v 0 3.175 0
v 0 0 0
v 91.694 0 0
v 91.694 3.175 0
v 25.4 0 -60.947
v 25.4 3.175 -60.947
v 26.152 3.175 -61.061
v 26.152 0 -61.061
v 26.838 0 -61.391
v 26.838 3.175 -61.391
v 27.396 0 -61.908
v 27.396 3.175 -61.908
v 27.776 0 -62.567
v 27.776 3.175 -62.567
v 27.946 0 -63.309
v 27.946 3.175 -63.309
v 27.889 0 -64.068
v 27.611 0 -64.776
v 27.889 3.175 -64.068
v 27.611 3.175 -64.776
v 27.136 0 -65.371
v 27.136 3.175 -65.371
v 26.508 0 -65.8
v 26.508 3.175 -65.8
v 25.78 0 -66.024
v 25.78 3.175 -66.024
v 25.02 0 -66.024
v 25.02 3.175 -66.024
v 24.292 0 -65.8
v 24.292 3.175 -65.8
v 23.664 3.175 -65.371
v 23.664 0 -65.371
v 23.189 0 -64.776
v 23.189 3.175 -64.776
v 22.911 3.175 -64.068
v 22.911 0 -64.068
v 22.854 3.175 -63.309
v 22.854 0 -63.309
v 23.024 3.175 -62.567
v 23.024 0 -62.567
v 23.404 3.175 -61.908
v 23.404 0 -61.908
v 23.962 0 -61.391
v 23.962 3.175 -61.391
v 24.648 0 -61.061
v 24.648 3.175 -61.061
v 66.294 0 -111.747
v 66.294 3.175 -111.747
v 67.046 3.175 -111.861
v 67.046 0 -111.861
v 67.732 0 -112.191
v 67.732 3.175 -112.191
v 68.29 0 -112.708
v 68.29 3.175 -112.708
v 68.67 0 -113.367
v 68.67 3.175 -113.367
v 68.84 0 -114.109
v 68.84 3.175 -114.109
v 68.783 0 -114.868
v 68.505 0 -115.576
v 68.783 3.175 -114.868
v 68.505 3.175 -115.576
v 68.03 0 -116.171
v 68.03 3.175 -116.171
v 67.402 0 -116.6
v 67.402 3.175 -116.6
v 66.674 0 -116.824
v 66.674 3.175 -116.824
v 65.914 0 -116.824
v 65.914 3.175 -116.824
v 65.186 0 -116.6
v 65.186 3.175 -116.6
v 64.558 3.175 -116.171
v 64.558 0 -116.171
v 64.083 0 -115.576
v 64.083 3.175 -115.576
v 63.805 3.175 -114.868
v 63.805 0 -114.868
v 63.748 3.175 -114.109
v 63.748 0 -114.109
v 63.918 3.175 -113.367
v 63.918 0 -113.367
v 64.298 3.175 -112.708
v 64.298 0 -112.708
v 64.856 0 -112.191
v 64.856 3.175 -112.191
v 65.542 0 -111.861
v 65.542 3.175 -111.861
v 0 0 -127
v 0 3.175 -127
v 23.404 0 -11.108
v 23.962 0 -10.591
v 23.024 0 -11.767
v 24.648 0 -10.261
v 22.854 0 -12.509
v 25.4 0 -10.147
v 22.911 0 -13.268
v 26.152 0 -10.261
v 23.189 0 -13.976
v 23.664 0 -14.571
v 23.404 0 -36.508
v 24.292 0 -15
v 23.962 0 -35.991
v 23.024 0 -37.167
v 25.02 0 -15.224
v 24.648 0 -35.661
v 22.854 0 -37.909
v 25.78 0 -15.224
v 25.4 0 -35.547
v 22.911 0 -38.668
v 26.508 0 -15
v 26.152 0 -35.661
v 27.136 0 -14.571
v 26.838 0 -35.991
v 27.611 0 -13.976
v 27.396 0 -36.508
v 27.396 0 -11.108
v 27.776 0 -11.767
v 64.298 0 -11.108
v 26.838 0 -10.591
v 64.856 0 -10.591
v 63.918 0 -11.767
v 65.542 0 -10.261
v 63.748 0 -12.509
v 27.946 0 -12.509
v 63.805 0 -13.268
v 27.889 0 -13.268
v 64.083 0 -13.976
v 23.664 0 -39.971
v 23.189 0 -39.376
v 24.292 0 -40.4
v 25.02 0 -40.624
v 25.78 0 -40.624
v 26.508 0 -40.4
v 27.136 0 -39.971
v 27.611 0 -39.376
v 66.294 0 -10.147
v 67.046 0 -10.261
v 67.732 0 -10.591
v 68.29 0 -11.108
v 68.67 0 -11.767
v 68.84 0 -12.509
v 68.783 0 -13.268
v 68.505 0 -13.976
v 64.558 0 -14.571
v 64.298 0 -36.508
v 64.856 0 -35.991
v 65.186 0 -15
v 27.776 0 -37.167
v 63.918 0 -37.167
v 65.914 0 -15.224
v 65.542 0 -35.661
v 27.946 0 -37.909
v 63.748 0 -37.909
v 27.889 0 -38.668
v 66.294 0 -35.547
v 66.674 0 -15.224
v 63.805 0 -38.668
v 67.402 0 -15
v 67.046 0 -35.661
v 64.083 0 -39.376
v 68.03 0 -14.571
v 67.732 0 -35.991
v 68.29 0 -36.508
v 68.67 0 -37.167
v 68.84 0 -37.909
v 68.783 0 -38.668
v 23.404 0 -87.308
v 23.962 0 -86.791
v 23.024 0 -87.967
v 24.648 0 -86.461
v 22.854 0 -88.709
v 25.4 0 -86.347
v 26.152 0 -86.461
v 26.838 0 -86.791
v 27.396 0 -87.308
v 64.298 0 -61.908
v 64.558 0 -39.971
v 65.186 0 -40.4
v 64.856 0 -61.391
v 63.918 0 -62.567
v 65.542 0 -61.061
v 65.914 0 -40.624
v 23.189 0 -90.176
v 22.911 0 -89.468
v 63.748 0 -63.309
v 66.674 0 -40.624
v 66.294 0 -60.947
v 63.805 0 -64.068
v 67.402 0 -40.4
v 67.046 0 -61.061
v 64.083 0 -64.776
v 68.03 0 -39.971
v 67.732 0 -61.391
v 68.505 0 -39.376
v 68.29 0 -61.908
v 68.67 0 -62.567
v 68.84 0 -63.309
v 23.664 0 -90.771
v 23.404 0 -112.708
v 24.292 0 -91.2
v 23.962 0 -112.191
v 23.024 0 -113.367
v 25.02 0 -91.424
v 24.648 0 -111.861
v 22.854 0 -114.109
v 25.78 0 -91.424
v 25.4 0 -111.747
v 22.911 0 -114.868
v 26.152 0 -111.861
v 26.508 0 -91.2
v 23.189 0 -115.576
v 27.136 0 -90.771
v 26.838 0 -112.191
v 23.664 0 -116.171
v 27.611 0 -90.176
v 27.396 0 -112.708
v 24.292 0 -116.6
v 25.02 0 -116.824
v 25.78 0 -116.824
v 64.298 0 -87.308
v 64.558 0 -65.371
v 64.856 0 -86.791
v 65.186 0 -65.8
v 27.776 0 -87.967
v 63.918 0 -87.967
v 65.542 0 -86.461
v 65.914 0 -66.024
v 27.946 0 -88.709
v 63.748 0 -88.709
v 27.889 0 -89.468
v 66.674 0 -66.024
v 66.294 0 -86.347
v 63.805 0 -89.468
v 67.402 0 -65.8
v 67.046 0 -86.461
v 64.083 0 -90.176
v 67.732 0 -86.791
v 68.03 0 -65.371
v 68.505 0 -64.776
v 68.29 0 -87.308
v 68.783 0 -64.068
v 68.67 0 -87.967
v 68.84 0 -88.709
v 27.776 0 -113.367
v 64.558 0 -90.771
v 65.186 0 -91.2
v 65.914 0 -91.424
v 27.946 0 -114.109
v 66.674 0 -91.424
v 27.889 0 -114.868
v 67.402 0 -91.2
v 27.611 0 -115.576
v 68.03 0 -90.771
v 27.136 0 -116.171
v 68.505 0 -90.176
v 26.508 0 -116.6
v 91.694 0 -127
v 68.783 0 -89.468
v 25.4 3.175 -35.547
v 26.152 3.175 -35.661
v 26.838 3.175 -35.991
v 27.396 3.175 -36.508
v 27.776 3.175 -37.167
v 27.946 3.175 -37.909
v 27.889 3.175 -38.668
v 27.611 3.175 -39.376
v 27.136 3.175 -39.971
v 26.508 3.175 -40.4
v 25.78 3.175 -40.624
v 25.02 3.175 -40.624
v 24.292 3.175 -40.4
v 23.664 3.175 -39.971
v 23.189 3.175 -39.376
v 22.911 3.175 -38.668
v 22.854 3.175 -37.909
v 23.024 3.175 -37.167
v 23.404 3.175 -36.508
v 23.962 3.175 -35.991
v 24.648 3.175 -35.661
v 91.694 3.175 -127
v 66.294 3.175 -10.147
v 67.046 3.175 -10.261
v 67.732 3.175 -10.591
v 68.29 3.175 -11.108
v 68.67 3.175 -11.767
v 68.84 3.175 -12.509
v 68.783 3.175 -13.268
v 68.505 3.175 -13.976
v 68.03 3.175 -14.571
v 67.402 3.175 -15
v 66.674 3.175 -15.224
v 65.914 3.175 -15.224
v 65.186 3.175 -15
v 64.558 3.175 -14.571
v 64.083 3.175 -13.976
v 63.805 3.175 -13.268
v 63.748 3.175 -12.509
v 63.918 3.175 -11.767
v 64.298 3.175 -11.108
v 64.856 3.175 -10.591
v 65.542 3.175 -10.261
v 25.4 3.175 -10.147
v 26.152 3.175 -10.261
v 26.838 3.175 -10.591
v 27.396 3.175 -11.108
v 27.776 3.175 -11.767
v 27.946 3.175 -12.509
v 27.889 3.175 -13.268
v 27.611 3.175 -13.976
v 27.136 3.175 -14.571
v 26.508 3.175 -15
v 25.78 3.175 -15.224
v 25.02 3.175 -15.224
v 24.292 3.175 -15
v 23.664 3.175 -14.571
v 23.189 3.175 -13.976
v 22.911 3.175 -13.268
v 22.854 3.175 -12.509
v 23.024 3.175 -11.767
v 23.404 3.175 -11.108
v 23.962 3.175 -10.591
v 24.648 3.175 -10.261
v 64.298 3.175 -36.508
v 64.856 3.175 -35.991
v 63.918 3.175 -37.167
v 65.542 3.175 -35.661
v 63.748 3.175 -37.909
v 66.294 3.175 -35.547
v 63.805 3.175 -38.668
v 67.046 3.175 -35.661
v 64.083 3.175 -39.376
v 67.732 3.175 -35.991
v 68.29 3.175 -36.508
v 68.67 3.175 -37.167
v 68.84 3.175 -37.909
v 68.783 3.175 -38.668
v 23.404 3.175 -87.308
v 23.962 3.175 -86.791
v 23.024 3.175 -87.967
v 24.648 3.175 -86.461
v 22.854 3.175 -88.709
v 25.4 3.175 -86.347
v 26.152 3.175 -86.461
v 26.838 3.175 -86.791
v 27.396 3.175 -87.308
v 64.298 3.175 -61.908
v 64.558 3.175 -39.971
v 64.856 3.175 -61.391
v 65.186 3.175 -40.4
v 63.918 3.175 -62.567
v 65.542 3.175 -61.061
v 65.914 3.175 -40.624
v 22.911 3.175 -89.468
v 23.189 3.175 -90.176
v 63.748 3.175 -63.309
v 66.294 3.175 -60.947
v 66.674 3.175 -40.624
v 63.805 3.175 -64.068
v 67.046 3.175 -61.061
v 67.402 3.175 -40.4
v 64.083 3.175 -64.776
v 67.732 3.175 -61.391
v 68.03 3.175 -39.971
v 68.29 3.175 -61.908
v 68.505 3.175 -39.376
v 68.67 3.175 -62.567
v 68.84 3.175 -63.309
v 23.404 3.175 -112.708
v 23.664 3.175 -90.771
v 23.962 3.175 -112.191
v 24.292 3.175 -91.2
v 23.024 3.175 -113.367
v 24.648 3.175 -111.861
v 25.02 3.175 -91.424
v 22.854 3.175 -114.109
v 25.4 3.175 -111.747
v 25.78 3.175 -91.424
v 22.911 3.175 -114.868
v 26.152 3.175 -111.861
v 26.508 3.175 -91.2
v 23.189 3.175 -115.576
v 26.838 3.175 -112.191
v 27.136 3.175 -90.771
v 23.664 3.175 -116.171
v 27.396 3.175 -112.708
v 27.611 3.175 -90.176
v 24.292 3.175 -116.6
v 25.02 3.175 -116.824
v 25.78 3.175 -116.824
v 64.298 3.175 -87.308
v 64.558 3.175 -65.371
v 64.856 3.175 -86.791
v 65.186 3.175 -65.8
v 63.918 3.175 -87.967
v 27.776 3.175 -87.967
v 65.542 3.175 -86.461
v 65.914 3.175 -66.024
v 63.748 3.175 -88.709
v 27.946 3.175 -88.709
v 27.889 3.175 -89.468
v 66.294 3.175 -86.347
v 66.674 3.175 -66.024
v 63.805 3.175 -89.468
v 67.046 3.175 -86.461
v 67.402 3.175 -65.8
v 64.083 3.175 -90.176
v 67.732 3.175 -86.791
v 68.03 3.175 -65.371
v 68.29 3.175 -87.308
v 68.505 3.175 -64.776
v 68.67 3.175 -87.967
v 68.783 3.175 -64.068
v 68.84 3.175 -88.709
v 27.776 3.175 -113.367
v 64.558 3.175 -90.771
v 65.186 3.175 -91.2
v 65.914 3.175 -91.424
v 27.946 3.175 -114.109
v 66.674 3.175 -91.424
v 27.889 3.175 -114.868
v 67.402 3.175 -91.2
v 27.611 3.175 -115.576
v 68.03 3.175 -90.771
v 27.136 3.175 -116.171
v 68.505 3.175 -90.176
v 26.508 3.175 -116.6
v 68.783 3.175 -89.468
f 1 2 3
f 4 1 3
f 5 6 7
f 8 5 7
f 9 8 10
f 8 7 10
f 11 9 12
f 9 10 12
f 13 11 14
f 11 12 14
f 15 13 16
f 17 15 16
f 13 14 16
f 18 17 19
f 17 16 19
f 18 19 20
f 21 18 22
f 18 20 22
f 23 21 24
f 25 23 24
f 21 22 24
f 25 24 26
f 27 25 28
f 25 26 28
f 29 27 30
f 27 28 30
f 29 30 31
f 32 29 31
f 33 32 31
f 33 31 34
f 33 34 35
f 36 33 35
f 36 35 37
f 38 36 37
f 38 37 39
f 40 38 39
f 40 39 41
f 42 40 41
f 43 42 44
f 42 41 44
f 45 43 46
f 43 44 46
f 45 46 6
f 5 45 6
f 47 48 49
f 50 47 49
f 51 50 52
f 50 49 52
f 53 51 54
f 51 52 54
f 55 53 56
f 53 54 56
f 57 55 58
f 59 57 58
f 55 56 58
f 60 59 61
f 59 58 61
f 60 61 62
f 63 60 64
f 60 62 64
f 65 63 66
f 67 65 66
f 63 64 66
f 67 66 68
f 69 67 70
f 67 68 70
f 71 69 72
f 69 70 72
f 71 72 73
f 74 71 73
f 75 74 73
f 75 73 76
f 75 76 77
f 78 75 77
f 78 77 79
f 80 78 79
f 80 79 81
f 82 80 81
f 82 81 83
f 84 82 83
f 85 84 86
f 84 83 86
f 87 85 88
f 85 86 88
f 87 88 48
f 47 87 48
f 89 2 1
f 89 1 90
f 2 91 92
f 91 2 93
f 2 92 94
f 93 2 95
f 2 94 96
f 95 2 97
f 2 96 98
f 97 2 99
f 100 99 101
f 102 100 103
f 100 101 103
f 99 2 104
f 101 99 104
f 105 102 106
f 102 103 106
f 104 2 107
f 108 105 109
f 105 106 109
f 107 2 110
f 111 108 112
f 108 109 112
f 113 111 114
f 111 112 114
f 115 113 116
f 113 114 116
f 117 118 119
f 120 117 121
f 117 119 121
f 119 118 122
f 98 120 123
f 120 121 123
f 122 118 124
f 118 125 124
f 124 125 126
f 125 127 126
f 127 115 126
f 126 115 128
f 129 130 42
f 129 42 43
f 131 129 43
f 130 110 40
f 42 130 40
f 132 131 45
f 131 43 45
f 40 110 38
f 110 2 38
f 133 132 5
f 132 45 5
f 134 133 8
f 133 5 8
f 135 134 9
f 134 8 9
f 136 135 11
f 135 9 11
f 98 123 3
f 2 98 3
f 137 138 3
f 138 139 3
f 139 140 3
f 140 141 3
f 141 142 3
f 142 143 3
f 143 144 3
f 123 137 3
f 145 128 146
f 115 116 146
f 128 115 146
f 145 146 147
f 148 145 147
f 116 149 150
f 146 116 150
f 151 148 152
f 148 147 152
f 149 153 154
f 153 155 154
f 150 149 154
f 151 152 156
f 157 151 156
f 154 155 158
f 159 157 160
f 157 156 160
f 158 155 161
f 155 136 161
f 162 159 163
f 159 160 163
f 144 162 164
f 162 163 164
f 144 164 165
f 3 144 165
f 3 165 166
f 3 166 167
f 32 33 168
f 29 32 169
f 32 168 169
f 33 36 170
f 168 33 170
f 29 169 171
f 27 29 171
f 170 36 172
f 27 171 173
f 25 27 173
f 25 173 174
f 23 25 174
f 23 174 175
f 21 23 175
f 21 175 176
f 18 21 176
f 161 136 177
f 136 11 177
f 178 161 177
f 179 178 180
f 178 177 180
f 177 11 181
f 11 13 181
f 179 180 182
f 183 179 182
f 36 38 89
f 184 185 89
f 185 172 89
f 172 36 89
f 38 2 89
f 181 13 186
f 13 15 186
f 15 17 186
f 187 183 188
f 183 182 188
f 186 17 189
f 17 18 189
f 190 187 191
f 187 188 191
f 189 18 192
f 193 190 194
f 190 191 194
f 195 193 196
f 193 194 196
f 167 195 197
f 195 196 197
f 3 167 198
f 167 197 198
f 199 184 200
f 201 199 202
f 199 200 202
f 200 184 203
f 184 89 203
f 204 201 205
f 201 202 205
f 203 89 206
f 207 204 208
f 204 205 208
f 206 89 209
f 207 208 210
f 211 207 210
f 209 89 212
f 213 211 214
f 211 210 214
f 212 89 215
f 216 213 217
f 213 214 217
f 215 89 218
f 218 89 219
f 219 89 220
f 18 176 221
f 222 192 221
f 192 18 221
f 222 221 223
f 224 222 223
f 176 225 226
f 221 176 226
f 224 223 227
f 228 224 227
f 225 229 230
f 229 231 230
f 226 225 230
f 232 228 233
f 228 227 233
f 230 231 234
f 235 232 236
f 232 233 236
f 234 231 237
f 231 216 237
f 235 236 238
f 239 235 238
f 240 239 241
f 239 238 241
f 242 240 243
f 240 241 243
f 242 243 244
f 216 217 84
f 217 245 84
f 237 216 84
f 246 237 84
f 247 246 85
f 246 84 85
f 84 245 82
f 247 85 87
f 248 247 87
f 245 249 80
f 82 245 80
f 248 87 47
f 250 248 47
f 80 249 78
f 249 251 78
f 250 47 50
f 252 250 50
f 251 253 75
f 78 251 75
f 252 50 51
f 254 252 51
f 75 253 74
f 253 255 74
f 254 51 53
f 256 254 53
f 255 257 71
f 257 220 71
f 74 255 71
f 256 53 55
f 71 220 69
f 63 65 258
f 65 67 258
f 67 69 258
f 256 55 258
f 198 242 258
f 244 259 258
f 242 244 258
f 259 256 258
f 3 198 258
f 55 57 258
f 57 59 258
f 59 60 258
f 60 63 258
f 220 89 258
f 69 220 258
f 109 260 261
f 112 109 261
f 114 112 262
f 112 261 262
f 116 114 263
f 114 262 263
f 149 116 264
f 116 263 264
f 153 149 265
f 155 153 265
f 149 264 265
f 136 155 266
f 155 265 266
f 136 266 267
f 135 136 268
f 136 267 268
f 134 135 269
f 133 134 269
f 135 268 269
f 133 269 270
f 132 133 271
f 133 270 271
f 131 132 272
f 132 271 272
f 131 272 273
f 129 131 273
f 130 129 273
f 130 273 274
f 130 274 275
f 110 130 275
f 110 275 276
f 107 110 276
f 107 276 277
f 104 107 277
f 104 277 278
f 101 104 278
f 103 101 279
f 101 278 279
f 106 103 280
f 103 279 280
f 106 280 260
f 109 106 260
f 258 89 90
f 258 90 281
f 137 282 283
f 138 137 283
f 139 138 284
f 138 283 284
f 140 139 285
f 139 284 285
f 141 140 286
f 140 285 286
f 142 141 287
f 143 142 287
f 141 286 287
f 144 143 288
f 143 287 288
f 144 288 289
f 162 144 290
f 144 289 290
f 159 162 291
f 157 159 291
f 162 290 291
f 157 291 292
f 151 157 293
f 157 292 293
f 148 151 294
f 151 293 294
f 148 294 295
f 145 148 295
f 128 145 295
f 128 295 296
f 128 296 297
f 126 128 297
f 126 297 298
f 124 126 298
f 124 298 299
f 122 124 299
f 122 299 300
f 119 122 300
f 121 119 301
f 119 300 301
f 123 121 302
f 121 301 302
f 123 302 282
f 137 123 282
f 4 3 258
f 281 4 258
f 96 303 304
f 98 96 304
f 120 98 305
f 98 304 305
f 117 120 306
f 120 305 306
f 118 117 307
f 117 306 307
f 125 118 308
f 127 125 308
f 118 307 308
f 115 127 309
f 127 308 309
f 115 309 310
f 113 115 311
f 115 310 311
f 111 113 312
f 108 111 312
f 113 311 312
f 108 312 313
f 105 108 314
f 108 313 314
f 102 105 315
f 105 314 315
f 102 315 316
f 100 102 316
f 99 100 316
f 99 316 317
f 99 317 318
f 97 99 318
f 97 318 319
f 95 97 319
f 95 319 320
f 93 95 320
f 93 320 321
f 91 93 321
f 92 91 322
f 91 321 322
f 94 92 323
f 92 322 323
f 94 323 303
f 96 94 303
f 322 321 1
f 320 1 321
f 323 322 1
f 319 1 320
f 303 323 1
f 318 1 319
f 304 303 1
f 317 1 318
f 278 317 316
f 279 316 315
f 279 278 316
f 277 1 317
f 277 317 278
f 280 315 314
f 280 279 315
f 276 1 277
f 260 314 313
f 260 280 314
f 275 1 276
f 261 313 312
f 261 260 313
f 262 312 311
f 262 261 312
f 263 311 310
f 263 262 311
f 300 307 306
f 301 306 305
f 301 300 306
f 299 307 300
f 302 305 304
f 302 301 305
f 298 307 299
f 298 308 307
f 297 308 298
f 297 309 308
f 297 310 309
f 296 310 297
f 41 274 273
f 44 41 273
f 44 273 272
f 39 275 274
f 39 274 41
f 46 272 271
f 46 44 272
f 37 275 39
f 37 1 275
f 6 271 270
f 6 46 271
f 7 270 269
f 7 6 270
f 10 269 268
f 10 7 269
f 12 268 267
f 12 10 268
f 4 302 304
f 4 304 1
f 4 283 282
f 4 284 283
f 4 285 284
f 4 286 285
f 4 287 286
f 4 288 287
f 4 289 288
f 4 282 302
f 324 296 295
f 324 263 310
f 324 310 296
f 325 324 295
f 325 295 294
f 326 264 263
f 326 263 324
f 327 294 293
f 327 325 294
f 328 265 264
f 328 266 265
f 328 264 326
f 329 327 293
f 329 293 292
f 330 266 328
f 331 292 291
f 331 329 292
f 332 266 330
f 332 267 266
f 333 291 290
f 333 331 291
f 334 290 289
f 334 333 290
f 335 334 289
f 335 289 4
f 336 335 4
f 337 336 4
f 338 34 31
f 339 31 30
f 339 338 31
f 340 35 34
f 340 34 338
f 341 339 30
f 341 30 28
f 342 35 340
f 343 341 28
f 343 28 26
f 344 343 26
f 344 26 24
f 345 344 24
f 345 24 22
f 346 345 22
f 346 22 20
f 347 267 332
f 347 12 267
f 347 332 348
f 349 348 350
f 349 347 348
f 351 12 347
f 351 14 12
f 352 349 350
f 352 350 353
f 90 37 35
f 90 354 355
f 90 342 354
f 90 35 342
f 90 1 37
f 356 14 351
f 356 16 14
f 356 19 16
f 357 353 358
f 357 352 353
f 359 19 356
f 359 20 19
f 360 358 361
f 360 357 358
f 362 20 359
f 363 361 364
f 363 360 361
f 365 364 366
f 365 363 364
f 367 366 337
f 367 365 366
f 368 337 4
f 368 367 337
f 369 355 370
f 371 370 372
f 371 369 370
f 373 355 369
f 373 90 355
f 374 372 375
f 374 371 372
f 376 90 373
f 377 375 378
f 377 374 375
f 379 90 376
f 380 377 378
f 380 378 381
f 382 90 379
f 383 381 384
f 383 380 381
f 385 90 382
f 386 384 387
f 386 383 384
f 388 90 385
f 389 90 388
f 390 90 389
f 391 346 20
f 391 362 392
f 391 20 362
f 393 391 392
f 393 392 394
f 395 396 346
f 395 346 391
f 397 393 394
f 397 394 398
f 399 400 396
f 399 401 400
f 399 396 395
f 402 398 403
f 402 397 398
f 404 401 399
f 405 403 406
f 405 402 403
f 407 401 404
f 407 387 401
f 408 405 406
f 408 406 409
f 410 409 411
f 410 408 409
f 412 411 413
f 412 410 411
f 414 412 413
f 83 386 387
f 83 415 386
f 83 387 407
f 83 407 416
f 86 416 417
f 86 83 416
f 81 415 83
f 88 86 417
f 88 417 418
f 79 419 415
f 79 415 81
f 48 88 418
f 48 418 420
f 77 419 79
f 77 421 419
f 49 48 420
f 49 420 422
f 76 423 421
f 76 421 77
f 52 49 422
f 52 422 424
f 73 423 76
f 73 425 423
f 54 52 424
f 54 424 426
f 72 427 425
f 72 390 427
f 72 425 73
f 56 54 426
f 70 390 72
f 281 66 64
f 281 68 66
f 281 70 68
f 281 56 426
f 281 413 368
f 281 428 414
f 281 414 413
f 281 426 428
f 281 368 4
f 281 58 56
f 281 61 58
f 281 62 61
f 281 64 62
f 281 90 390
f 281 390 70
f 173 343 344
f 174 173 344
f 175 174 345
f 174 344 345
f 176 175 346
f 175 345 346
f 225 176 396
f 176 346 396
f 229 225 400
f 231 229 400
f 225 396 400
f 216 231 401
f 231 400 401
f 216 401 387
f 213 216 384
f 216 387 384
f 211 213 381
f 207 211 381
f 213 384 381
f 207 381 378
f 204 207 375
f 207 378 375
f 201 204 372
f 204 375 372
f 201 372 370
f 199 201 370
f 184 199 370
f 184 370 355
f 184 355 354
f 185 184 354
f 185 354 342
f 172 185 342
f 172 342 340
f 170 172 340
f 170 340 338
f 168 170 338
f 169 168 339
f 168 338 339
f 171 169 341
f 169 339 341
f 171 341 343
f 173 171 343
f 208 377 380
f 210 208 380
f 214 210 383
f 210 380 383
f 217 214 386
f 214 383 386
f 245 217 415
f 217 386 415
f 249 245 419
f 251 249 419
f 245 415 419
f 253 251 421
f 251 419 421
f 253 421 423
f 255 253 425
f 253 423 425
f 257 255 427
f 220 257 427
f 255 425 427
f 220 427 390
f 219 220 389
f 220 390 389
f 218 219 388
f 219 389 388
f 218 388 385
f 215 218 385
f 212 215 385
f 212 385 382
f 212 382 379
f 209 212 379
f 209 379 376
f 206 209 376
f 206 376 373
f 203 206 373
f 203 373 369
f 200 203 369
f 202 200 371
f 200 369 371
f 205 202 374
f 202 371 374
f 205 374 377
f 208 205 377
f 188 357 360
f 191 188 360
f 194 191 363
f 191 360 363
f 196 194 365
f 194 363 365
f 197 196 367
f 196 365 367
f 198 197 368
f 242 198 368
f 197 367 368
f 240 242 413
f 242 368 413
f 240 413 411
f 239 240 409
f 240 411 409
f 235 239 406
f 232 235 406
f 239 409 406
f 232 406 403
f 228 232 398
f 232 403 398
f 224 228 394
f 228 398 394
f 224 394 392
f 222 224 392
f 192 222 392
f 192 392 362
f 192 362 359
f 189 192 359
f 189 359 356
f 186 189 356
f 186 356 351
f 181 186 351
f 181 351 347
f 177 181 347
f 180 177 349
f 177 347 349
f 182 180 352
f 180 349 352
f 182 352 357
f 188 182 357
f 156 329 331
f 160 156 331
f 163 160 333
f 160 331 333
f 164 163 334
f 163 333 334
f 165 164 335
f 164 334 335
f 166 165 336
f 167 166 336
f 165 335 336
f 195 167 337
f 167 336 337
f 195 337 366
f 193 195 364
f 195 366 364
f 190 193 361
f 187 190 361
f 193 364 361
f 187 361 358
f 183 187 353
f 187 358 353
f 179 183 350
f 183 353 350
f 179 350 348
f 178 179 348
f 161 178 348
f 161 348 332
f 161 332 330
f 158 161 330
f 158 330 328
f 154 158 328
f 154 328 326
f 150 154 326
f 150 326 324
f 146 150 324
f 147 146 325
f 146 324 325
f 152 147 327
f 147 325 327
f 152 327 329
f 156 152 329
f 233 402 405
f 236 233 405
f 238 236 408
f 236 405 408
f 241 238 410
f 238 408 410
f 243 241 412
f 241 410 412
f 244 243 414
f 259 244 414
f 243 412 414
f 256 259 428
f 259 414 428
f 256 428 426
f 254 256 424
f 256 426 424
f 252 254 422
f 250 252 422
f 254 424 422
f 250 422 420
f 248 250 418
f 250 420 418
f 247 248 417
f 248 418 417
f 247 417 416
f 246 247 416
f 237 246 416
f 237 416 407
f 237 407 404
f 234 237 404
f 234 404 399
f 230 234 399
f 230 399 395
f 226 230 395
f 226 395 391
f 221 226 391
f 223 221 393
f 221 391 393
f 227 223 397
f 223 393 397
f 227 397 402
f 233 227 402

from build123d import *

# Parameters (mm, degrees)
SKETCH1_W           = 91.694
SKETCH1_H           = 127
BOSS_EXTRUDE1_DEPTH = 3.175
SKETCH2_R           = 2.5527
CUT_EXTRUDE1_DEPTH  = 3.175
LPATTERN1_COUNT     = 5
LPATTERN1_PITCH     = 25.4
SKETCH3_R           = 2.5527
CUT_EXTRUDE2_DEPTH  = 3.175
LPATTERN2_COUNT     = 5
LPATTERN2_PITCH     = 25.4


with BuildPart() as part:
    # Sketch1 → Boss-Extrude1 (new body)
    with BuildSketch(Plane(origin=(0, 0, 0), x_dir=(1, 0, 0), z_dir=(0, 1, 0))):
        with Locations((45.847, 63.5)):
            Rectangle(SKETCH1_W, SKETCH1_H)
    extrude(amount=BOSS_EXTRUDE1_DEPTH)

    # Sketch2 → Cut-Extrude1 (cut)
    with BuildSketch(Plane(origin=(0, 3.175, 0), x_dir=(1, 0, 0), z_dir=(0, 1, 0))):
        with Locations(Location((25.4, 12.7, 0), (0, 0, 270))):
            Circle(SKETCH2_R)
    cut_extrude1 = extrude(amount=-CUT_EXTRUDE1_DEPTH, mode=Mode.SUBTRACT)

    # LPattern1: Cut-Extrude1 ×5
    with Locations(*[(0, 0, -i * LPATTERN1_PITCH) for i in range(1, LPATTERN1_COUNT)]):
        add(cut_extrude1, mode=Mode.SUBTRACT)

    # Sketch3 → Cut-Extrude2 (cut)
    with BuildSketch(Plane(origin=(0, 3.175, 0), x_dir=(1, 0, 0), z_dir=(0, 1, 0))):
        with Locations(Location((66.294, 12.7, 0), (0, 0, 270))):
            Circle(SKETCH3_R)
    cut_extrude2 = extrude(amount=-CUT_EXTRUDE2_DEPTH, mode=Mode.SUBTRACT)

    # LPattern2: Cut-Extrude2 ×5
    with Locations(*[(0, 0, -i * LPATTERN2_PITCH) for i in range(1, LPATTERN2_COUNT)]):
        add(cut_extrude2, mode=Mode.SUBTRACT)


solid = part.part
